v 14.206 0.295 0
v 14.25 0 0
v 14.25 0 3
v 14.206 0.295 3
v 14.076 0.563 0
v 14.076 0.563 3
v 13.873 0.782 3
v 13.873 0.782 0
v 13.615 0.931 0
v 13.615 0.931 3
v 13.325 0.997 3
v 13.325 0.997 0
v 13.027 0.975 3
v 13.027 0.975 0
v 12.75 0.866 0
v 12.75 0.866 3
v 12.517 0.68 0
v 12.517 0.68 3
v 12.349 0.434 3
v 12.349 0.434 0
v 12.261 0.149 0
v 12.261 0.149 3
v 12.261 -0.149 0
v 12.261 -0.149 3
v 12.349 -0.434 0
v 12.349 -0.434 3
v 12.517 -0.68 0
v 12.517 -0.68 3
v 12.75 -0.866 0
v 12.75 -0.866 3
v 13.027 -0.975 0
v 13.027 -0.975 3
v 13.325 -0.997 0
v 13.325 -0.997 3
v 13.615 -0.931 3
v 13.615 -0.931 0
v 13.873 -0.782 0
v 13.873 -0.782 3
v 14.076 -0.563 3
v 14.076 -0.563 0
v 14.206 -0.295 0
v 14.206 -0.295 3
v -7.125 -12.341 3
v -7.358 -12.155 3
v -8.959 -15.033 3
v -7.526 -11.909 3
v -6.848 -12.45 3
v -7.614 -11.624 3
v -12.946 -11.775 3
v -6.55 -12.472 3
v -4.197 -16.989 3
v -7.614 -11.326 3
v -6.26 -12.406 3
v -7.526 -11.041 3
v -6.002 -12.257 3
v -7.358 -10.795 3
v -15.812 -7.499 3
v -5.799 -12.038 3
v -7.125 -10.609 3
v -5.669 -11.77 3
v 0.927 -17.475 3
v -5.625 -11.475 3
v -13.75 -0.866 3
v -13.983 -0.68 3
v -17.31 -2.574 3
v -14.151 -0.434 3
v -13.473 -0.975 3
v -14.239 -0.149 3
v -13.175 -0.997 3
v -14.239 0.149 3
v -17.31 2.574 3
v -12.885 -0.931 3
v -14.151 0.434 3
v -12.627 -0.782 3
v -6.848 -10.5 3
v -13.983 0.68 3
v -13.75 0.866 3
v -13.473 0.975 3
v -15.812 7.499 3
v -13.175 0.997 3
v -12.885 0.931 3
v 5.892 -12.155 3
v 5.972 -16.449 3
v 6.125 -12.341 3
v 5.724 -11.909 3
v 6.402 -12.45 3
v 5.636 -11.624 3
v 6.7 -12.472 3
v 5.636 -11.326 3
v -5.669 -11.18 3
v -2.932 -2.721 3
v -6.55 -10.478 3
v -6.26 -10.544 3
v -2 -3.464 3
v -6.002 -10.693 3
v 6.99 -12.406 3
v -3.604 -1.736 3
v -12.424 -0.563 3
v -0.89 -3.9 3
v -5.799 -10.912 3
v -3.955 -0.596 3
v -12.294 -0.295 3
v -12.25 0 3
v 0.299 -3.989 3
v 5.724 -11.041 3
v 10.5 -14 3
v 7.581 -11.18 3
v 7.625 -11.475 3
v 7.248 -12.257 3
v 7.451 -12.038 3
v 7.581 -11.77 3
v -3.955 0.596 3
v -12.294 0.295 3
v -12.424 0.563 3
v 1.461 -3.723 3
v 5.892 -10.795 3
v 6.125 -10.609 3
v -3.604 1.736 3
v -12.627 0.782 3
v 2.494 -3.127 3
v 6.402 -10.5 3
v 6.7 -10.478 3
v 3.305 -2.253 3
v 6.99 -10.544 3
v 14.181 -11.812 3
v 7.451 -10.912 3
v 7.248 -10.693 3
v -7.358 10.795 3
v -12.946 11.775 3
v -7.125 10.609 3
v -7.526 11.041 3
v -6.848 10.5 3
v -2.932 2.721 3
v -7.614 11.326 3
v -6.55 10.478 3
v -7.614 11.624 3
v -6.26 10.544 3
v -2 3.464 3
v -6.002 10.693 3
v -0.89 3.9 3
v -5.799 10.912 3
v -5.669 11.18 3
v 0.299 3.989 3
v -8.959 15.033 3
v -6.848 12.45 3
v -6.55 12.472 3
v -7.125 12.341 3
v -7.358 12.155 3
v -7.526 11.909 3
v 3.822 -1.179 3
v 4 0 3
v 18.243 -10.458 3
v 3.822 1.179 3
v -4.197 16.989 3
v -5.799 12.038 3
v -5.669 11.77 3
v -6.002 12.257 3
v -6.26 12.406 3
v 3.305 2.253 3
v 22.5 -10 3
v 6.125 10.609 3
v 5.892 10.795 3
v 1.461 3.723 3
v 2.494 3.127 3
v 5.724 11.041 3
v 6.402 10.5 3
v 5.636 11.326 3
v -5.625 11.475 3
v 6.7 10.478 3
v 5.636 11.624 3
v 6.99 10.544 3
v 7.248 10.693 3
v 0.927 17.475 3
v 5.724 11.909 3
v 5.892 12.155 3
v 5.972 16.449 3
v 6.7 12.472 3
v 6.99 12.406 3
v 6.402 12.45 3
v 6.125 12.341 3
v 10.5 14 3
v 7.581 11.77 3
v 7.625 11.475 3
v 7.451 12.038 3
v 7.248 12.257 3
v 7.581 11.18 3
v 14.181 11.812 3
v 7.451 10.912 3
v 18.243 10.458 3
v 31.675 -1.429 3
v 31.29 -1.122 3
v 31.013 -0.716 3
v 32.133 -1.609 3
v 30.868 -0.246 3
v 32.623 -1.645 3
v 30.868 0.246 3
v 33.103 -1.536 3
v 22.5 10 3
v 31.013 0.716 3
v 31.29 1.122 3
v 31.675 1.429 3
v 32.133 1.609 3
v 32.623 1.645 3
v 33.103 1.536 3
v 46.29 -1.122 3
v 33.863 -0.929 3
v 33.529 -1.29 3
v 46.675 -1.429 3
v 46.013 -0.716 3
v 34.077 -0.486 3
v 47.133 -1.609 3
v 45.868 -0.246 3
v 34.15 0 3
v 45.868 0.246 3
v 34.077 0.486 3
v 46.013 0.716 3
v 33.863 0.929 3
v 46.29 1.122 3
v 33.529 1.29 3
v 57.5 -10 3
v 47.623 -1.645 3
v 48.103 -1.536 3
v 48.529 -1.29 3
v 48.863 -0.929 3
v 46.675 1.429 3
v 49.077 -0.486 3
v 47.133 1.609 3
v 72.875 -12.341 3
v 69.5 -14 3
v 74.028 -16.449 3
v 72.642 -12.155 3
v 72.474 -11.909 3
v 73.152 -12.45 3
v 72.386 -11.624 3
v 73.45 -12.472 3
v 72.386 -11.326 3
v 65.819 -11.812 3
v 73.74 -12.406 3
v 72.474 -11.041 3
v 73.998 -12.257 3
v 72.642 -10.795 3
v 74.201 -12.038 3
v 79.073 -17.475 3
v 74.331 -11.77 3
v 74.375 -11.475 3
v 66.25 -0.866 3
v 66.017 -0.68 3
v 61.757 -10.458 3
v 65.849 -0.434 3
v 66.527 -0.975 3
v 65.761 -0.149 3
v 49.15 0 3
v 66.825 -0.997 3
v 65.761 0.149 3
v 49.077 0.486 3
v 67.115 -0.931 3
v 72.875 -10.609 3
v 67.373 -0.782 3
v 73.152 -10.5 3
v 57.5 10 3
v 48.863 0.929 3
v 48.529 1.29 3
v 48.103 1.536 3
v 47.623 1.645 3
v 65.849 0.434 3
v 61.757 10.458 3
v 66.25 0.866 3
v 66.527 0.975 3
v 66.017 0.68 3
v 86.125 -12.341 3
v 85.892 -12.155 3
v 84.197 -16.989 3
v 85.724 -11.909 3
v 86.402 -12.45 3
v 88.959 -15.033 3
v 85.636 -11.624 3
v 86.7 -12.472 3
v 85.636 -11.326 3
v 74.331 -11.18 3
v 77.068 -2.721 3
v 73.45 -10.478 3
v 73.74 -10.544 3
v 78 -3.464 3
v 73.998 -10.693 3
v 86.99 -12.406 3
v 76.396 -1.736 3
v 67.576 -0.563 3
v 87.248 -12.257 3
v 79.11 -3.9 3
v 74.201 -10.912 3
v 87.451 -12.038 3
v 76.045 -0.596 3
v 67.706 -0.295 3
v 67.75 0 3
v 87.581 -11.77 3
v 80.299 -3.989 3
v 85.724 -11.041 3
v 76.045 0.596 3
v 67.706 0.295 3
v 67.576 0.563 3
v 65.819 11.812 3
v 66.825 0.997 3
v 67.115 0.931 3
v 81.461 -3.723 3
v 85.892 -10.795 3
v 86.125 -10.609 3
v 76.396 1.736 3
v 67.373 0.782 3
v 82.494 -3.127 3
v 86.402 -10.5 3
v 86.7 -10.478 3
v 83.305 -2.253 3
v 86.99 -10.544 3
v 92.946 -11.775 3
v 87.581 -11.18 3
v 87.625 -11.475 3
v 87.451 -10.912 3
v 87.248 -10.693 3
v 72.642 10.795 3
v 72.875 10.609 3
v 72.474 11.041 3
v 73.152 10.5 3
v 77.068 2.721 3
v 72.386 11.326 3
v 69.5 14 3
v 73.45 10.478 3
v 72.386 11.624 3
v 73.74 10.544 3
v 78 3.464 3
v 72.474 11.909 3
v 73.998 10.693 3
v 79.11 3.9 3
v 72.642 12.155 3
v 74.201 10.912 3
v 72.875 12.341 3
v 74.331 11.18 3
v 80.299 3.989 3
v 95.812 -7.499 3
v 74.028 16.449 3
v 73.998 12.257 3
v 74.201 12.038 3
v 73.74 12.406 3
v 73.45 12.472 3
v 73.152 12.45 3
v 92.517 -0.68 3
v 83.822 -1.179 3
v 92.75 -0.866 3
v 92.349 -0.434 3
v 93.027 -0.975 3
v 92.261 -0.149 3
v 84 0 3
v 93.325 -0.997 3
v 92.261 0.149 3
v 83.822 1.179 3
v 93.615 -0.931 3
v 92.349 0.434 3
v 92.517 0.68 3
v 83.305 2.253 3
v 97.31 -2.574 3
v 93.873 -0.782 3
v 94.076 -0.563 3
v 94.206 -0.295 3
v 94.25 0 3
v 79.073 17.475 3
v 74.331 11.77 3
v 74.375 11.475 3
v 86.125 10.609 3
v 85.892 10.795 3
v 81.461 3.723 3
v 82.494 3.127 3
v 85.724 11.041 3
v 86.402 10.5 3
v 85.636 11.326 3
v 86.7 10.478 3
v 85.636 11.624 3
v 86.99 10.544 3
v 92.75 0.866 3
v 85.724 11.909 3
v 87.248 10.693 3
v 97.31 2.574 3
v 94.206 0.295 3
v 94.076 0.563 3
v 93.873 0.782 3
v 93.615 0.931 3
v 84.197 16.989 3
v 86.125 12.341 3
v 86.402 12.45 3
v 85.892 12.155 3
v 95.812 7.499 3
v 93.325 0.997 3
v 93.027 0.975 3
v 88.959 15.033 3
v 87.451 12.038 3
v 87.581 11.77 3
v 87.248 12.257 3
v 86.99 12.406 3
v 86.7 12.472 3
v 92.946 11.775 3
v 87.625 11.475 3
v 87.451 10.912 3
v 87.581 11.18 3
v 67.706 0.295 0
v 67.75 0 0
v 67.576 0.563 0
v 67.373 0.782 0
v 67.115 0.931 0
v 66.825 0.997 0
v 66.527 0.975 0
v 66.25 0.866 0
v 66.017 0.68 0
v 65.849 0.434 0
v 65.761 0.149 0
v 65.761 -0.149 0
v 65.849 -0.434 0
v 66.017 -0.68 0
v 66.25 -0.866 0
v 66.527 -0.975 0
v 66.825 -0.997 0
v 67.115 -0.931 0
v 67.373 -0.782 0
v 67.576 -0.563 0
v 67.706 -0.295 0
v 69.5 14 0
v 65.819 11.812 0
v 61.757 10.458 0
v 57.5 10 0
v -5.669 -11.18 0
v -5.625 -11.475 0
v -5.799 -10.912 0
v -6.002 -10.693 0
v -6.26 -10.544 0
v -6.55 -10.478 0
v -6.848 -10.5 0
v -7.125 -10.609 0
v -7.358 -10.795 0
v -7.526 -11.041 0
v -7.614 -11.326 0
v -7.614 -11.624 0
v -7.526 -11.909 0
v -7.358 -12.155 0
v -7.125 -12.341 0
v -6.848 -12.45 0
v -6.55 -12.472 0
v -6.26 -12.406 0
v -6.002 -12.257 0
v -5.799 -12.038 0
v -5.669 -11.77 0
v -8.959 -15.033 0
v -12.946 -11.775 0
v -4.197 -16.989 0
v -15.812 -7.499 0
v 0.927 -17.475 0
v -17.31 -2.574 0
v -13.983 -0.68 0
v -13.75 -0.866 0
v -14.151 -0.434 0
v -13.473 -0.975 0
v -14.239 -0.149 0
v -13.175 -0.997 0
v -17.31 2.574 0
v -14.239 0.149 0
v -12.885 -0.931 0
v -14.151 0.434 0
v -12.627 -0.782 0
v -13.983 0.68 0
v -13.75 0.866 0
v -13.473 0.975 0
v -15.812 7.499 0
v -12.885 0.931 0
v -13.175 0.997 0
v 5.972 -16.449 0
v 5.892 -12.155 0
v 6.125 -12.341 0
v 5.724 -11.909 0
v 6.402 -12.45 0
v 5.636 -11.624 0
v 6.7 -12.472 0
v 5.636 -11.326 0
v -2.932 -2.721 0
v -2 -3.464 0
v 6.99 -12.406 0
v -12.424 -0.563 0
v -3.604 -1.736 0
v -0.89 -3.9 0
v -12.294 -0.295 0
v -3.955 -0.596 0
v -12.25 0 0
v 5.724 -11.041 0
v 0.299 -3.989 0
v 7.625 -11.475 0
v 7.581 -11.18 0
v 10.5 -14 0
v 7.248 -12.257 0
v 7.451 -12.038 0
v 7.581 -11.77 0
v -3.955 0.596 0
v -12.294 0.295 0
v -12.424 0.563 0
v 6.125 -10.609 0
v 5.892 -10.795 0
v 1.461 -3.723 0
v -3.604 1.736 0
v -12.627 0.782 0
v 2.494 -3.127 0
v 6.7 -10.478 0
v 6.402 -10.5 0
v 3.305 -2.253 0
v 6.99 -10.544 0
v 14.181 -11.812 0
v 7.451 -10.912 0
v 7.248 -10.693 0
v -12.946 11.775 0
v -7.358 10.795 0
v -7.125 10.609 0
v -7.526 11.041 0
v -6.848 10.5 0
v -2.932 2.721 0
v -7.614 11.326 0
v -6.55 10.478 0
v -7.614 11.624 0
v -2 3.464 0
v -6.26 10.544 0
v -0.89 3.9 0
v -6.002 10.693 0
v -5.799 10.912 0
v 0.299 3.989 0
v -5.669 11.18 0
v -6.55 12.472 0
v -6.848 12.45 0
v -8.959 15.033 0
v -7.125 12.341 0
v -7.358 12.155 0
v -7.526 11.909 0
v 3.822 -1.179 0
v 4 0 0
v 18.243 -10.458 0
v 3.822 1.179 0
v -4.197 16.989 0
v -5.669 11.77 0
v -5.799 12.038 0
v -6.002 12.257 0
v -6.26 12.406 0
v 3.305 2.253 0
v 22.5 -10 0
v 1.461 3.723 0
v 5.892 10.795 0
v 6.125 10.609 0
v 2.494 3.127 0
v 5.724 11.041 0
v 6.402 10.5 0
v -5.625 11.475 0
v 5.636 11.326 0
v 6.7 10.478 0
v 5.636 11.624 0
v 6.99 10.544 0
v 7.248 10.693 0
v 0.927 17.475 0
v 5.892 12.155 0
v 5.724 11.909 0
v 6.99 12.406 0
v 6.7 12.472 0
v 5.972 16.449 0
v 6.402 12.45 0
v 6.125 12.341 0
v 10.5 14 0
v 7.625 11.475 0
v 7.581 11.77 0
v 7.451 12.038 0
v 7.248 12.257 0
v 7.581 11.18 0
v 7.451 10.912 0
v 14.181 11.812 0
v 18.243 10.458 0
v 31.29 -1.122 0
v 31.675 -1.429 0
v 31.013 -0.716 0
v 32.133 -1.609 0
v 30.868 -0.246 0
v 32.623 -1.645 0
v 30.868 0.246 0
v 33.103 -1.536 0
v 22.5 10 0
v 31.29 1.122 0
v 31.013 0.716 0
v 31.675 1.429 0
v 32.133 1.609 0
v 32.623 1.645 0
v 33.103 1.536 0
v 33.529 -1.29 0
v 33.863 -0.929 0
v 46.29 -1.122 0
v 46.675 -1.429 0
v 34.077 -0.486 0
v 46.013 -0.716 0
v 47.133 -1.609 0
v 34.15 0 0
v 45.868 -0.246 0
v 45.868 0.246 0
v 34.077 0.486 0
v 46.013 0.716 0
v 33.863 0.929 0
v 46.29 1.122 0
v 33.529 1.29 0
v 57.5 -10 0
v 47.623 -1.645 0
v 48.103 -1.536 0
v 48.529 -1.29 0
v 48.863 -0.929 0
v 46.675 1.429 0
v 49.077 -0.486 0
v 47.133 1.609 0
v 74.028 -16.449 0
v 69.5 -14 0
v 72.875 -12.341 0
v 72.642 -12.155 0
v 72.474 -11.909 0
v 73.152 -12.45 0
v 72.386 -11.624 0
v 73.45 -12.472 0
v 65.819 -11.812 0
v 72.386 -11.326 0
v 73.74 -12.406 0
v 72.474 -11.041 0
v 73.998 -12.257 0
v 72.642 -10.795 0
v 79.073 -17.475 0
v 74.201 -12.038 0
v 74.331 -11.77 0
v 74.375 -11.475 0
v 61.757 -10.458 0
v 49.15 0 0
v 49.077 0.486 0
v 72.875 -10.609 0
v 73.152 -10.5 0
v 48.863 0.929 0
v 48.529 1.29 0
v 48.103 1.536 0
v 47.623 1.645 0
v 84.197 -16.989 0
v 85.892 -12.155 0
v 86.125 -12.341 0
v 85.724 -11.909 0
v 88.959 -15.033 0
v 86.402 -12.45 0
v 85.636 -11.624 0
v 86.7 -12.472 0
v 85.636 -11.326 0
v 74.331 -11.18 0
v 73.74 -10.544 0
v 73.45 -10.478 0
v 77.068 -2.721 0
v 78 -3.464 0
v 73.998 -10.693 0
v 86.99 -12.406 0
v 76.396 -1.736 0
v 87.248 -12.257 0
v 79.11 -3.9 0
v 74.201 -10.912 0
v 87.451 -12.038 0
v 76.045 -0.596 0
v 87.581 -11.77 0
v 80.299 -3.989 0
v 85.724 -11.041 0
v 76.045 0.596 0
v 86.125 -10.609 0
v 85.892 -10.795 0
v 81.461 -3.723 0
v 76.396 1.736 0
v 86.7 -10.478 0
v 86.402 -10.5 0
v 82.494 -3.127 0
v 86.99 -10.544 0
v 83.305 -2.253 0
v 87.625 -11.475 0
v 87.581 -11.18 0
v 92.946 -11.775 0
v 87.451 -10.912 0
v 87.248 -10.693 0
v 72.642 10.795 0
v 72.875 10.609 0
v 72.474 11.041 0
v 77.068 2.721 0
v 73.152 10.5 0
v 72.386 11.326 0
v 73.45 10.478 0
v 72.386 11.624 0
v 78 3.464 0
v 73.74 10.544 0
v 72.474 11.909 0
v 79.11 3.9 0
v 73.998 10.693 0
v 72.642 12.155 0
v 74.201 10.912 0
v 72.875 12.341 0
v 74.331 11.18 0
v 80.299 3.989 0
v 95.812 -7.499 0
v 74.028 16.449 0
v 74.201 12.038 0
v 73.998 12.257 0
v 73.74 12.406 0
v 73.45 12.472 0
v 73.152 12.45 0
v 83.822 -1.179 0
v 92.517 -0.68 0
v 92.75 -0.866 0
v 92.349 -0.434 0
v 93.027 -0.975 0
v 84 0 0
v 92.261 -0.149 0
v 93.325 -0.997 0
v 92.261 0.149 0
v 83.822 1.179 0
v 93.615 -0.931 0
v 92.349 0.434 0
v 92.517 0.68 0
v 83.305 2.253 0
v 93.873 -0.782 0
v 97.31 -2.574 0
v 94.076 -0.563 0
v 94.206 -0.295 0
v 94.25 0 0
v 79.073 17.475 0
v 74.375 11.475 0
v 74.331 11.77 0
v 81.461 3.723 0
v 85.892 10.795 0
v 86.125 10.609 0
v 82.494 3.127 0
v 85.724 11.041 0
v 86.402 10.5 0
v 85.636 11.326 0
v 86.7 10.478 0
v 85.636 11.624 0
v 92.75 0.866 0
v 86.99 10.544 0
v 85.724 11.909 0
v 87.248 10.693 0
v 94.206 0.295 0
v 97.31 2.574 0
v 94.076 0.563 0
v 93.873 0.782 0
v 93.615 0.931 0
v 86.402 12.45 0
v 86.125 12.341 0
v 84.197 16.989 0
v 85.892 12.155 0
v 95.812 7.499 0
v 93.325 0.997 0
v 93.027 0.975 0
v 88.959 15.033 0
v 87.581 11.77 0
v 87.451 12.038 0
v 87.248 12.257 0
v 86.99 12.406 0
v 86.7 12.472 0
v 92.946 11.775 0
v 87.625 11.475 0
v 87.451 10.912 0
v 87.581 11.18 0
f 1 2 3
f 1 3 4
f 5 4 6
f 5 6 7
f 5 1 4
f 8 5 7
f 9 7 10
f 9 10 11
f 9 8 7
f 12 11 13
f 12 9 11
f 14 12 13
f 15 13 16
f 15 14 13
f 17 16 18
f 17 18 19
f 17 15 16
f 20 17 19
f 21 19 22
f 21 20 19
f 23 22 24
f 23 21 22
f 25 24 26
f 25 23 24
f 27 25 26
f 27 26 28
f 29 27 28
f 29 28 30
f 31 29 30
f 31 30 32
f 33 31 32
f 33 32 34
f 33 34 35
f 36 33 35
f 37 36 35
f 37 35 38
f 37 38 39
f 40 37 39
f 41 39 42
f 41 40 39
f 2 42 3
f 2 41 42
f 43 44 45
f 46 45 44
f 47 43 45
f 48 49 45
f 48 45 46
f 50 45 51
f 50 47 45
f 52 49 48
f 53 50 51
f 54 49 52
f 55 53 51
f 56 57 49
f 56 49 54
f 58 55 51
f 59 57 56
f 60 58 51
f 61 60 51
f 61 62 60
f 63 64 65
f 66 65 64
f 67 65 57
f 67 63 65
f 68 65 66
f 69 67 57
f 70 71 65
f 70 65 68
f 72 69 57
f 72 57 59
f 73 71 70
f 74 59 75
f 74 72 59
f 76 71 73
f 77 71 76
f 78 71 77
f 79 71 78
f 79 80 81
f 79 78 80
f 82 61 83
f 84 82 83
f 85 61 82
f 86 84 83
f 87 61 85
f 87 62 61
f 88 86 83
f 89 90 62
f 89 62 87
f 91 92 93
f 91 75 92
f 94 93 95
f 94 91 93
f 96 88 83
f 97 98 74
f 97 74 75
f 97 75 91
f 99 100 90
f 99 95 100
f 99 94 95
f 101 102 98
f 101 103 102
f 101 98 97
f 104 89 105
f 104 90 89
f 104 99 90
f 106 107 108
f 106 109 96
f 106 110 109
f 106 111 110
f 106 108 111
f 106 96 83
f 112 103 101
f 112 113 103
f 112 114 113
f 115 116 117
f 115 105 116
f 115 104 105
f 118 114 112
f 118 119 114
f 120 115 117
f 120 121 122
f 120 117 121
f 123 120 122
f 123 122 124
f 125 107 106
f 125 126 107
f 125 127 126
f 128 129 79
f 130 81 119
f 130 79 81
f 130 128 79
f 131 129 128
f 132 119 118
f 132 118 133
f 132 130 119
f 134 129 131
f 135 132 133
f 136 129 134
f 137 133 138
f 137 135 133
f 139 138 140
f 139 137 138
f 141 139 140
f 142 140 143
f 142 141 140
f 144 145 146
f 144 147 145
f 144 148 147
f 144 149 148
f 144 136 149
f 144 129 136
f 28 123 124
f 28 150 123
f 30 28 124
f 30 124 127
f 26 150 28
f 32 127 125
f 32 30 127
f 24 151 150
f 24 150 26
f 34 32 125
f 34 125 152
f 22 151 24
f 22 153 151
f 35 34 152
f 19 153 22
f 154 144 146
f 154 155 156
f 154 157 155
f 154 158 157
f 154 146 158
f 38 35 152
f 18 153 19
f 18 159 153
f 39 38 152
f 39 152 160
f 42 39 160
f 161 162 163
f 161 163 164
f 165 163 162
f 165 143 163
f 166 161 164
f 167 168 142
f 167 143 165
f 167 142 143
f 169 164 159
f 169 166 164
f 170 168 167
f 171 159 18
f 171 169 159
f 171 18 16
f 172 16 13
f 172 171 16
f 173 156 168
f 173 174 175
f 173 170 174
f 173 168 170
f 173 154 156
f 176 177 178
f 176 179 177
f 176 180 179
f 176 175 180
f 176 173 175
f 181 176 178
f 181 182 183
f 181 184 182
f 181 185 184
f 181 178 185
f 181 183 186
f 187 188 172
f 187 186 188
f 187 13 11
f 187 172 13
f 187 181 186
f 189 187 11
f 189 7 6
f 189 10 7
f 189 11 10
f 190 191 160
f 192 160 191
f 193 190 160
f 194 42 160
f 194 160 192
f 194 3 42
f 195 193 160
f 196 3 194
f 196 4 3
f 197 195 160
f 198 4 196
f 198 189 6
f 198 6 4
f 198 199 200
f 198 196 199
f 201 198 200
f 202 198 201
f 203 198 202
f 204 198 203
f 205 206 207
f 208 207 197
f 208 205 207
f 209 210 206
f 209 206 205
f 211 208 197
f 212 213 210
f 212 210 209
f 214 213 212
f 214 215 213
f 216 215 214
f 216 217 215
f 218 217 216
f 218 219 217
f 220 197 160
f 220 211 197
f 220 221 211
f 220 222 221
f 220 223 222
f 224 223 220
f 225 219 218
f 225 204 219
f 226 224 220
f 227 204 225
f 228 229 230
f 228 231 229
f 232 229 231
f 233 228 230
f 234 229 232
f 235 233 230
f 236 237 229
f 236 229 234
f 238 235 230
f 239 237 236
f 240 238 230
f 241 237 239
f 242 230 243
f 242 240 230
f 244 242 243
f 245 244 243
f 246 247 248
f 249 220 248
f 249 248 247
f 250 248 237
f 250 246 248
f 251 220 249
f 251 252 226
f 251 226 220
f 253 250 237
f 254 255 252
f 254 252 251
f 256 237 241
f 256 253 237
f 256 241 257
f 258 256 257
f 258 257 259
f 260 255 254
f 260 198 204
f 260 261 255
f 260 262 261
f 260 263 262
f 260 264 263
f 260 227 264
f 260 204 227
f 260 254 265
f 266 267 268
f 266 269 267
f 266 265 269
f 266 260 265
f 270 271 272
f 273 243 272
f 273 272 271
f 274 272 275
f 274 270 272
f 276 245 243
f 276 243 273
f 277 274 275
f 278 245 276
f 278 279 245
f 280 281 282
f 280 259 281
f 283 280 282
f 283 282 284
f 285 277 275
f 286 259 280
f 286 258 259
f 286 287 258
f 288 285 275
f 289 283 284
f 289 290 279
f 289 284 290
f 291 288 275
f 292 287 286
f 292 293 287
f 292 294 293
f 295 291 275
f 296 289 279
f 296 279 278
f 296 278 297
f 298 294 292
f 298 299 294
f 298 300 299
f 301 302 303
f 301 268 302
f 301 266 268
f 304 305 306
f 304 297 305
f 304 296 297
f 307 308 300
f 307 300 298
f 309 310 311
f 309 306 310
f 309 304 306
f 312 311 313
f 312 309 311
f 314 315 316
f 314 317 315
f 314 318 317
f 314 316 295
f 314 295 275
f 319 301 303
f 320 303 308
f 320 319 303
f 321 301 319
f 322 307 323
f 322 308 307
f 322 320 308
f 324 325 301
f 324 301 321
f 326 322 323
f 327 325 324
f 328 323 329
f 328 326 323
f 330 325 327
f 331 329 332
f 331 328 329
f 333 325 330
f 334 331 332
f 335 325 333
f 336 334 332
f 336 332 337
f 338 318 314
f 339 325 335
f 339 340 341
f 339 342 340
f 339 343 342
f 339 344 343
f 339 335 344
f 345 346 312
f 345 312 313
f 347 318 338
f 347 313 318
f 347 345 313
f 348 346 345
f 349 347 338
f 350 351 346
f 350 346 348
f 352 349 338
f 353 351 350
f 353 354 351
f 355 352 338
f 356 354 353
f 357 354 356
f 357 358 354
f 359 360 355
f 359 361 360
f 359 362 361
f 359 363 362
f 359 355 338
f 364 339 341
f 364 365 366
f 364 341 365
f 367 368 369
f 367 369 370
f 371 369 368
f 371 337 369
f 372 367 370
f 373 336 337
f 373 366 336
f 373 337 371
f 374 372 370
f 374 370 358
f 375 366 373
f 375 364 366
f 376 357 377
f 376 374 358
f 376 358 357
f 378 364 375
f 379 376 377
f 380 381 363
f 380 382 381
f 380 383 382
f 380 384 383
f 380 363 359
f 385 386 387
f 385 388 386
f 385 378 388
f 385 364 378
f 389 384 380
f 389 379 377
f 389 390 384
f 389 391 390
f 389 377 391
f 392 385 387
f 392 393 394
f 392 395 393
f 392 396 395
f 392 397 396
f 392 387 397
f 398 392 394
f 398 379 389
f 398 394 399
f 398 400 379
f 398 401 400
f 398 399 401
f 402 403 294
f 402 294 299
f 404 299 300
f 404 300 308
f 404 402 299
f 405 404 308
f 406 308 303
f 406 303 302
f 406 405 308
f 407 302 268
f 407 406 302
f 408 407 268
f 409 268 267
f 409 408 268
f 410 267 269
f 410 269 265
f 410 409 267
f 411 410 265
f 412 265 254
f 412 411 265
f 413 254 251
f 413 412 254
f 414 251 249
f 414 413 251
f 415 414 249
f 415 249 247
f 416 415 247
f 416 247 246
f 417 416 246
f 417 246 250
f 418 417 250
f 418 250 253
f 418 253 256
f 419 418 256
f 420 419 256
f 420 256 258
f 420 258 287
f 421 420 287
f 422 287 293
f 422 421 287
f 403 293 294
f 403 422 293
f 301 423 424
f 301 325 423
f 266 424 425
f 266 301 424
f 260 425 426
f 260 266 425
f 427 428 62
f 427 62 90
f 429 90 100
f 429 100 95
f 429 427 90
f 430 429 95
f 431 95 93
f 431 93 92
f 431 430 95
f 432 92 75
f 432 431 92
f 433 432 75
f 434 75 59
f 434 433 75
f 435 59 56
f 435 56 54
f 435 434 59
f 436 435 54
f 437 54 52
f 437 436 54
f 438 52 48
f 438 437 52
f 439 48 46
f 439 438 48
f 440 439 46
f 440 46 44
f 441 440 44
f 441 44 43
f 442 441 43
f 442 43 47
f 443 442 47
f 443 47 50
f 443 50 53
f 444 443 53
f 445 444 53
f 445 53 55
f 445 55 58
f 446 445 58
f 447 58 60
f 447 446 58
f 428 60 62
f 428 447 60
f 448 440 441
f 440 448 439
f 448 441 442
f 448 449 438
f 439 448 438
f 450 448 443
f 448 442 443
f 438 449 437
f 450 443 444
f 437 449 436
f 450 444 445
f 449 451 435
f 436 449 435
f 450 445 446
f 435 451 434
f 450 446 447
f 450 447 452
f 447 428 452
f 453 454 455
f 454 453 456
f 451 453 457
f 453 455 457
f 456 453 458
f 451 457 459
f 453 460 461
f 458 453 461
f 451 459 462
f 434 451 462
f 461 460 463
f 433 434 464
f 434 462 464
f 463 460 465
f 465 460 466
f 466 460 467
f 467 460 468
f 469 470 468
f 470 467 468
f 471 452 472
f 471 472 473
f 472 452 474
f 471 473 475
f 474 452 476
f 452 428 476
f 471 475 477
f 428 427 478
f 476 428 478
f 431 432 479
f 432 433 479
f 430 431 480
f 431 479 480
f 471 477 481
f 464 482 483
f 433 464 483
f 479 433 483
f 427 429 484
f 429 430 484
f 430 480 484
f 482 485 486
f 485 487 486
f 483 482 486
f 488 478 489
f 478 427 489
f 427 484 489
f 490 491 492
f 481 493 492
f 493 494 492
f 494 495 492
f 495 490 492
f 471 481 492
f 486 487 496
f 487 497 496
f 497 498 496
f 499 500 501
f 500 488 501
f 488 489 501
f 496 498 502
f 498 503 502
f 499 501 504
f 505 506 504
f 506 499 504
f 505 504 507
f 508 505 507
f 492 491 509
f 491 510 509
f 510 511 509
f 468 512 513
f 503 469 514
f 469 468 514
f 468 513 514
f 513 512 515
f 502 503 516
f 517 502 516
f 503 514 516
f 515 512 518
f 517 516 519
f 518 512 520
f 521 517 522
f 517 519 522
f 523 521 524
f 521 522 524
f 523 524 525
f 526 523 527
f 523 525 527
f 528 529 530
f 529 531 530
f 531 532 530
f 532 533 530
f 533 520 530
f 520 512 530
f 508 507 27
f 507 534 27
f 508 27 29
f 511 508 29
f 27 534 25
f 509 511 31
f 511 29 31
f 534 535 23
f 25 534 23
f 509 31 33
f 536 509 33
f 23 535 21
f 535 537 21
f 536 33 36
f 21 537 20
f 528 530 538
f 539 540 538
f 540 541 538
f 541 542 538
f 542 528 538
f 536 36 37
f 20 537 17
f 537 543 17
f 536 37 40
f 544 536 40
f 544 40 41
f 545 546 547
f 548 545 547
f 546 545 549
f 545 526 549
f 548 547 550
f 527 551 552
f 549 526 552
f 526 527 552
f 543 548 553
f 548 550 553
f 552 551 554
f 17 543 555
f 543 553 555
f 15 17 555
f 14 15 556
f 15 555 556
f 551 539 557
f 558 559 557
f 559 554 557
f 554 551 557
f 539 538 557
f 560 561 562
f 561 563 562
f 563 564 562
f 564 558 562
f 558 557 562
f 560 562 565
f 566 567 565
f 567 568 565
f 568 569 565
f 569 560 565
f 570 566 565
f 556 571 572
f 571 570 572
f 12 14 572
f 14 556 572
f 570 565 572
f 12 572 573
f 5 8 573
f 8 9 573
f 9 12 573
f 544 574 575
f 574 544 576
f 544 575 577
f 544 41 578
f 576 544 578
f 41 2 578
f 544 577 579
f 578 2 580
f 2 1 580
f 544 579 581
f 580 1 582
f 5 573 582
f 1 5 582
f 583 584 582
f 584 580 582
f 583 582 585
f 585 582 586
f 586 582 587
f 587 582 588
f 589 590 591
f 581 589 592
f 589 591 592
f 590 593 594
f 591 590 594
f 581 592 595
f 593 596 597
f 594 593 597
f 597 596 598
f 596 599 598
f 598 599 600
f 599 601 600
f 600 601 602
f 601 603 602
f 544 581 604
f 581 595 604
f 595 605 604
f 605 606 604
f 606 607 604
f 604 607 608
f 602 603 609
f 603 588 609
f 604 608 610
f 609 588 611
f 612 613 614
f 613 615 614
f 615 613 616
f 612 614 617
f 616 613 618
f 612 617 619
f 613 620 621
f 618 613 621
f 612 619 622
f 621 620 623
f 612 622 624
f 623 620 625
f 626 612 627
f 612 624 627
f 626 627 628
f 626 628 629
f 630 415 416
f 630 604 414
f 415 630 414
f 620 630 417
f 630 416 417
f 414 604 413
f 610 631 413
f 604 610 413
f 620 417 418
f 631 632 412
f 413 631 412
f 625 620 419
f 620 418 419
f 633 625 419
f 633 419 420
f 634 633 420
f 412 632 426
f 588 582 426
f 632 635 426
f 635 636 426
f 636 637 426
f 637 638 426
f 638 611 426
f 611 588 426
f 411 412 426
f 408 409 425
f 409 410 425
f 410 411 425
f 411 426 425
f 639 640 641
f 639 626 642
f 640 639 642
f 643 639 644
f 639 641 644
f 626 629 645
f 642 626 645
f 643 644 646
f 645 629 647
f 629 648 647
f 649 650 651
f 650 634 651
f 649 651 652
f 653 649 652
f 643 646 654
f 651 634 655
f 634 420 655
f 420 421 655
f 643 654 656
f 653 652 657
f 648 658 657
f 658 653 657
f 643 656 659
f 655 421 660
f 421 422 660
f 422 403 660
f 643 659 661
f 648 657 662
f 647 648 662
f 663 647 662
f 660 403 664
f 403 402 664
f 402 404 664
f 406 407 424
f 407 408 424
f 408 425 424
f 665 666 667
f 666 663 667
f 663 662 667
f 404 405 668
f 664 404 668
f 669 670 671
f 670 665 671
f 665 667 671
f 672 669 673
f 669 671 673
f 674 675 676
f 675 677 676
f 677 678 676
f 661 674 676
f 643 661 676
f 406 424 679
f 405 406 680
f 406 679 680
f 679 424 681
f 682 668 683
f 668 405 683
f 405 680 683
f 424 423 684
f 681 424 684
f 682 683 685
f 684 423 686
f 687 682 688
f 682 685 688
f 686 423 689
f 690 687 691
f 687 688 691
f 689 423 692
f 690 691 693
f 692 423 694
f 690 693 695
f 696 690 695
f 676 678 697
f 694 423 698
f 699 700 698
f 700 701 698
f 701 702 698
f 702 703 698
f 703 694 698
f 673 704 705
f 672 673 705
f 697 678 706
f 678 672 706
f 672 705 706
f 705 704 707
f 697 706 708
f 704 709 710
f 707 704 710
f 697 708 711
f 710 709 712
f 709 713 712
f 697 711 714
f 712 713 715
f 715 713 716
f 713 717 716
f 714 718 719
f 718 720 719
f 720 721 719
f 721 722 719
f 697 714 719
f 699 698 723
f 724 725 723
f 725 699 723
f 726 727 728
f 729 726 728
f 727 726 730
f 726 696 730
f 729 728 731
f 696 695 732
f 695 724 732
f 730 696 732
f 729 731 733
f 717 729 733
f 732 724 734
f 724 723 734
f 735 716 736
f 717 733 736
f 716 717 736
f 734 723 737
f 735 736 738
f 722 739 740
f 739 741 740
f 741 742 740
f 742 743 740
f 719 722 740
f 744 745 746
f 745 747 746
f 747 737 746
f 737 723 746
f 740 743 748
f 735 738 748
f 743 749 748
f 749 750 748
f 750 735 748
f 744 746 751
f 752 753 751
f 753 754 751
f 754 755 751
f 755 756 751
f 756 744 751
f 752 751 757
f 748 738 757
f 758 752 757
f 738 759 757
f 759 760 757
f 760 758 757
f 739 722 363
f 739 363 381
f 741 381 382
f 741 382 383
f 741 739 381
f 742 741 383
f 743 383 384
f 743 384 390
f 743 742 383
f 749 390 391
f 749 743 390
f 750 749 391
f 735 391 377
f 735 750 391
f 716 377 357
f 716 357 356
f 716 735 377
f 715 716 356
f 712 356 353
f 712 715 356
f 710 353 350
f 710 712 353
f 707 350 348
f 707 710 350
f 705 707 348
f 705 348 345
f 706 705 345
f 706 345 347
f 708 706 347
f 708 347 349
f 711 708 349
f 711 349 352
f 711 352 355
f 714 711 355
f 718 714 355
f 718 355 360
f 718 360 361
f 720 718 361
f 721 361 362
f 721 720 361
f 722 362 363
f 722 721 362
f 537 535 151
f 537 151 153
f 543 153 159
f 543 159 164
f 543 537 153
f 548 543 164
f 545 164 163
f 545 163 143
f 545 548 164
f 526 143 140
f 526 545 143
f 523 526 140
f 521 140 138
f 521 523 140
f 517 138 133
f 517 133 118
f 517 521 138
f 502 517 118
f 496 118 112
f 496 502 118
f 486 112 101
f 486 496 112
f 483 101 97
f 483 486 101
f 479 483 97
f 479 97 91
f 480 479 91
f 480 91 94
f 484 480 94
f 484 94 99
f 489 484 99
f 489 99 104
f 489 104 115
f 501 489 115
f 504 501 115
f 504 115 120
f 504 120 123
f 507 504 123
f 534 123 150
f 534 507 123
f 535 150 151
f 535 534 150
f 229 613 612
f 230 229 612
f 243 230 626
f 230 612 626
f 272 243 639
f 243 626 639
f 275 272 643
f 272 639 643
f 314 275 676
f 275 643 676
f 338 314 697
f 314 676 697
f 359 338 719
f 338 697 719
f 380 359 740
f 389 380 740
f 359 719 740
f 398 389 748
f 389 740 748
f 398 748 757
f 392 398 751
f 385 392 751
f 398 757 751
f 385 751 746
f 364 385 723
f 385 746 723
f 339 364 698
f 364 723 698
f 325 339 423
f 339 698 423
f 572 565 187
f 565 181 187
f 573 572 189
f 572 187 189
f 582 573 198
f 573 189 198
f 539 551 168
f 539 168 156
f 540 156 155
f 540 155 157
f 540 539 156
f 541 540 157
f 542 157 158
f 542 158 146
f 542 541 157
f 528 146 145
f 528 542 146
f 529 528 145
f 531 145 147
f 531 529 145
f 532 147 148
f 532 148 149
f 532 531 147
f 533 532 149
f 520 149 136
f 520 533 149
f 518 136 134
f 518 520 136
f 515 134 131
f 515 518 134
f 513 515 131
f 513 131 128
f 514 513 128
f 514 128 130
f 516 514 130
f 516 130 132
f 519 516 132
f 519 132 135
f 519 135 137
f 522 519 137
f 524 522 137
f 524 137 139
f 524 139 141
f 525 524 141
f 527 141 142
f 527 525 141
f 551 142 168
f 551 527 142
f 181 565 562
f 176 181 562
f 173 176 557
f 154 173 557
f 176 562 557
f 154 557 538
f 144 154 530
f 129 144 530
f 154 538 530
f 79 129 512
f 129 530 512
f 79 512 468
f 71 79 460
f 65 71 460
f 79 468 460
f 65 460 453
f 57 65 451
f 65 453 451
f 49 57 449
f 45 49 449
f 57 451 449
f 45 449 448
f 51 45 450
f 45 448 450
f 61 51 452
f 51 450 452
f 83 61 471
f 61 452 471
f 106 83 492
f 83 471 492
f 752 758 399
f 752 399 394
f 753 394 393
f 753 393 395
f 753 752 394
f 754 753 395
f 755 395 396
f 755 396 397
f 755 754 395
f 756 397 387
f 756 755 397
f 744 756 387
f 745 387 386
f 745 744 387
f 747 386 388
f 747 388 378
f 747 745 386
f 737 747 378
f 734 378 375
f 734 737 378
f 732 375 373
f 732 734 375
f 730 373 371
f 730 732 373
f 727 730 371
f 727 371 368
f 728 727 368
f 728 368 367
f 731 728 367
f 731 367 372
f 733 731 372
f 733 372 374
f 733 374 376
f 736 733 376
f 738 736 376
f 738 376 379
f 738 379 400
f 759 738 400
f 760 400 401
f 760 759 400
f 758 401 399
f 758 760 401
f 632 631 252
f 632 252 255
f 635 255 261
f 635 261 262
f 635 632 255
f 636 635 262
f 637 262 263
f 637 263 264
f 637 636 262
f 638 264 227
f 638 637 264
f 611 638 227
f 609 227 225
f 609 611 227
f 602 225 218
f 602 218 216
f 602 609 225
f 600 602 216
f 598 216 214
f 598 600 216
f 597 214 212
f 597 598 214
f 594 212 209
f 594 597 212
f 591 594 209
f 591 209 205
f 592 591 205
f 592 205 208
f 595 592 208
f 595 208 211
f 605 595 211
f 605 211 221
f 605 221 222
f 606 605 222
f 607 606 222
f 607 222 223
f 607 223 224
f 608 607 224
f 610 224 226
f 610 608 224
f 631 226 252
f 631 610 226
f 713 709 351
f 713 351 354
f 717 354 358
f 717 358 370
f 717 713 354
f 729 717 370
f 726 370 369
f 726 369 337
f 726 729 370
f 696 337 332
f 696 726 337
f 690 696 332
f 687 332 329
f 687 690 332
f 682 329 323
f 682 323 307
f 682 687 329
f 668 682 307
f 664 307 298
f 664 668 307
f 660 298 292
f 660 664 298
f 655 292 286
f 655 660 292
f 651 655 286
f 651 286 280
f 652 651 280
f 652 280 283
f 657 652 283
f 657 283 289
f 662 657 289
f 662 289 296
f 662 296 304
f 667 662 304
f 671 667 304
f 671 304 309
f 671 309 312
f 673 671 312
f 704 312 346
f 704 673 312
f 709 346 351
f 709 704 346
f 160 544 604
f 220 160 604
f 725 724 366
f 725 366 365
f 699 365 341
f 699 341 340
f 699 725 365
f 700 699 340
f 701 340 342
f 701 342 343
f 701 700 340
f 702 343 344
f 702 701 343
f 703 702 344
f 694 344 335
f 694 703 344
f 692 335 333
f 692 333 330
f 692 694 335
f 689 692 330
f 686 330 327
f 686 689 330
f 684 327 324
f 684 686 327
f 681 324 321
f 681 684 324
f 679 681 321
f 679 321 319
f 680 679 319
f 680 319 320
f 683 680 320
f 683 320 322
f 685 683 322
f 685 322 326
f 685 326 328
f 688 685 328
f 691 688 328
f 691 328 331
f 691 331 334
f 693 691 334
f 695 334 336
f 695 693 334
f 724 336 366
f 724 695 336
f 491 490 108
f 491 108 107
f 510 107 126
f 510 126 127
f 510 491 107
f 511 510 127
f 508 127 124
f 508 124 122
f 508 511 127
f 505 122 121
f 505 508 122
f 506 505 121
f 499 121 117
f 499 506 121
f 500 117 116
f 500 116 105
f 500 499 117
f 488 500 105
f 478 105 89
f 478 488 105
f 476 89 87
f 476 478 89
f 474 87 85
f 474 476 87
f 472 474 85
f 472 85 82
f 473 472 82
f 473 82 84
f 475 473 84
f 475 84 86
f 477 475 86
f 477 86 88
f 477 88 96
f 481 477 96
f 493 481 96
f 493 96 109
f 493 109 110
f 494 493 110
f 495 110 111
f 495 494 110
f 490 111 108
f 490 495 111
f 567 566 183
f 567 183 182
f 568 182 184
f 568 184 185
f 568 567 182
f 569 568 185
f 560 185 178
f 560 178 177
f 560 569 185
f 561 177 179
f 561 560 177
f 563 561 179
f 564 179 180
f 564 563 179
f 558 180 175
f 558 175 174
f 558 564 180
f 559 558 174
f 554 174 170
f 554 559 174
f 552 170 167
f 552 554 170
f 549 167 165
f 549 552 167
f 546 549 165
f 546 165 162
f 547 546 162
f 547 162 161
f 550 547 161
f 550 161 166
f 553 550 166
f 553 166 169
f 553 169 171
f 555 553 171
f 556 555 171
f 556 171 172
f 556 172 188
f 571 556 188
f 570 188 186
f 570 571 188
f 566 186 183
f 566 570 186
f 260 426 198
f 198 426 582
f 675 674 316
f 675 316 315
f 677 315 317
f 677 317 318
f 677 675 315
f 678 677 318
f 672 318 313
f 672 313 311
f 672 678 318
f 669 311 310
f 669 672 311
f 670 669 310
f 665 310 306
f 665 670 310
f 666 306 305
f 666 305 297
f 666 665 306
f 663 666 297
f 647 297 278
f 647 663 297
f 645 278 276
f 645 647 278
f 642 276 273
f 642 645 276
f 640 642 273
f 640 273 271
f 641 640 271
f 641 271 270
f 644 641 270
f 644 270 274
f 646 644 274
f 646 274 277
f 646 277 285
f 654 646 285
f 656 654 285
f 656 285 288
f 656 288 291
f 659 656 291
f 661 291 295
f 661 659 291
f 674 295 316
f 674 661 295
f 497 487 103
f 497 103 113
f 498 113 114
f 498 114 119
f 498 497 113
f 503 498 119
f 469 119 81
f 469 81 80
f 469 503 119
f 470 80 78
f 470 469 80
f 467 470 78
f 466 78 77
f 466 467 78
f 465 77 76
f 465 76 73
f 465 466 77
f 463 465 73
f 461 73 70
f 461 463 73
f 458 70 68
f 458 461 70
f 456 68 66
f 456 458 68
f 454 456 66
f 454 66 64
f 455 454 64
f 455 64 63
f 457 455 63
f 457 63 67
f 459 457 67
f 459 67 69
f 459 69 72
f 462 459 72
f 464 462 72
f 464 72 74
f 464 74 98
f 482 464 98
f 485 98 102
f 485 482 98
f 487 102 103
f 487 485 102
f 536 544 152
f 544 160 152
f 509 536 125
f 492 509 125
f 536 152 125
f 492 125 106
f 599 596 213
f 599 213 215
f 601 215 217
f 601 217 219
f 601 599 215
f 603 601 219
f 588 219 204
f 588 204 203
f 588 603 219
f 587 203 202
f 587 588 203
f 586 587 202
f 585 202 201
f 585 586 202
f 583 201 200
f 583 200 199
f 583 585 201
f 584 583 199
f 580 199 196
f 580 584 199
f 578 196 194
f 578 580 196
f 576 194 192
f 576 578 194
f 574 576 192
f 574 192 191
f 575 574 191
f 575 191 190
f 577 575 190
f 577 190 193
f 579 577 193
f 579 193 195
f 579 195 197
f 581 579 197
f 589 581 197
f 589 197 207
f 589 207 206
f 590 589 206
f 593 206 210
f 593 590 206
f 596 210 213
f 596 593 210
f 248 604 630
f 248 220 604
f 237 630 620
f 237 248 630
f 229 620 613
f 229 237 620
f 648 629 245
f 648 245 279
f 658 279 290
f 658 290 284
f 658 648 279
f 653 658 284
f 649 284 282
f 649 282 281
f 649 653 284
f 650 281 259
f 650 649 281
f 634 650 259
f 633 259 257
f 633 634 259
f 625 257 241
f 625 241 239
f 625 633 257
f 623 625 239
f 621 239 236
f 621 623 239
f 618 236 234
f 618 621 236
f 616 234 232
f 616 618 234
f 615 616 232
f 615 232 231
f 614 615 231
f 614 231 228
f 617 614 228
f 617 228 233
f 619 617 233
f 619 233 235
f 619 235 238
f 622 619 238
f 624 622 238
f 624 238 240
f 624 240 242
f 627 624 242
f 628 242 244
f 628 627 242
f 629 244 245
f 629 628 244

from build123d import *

# Parameters (mm, degrees)
ESBO_O1_R                = 4
ESBO_O1_R_2              = 1
ESBO_O1_R_3              = 1.65
RESSALTO_EXTRUS_O1_DEPTH = 3
FILETE1_R                = 20


with BuildPart() as part:
    # Esboço1 → Ressalto-extrusão1 (new body)
    with BuildSketch(Plane.XY):
        with BuildLine():
            Line((14.361406616, -10), (65.638593384, -10))
            ThreePointArc((65.638593384, -10), (97.5, 0), (65.638593384, 10))
            Line((65.638593384, 10), (14.361406616, 10))
            ThreePointArc((14.361406616, 10), (-17.5, 0), (14.361406616, -10))
        make_face()
        Circle(ESBO_O1_R, mode=Mode.SUBTRACT)
        with Locations((-13.25, 0)):
            Circle(ESBO_O1_R_2, mode=Mode.SUBTRACT)
        with Locations((-6.625, 11.4748366)):
            Circle(ESBO_O1_R_2, mode=Mode.SUBTRACT)
        with Locations((86.625, -11.4748366)):
            Circle(ESBO_O1_R_2, mode=Mode.SUBTRACT)
        with Locations((6.625, 11.4748366)):
            Circle(ESBO_O1_R_2, mode=Mode.SUBTRACT)
        with Locations((80, 0)):
            Circle(ESBO_O1_R, mode=Mode.SUBTRACT)
        with Locations((13.25, 0)):
            Circle(ESBO_O1_R_2, mode=Mode.SUBTRACT)
        with Locations((6.625, -11.4748366)):
            Circle(ESBO_O1_R_2, mode=Mode.SUBTRACT)
        with Locations((-6.625, -11.4748366)):
            Circle(ESBO_O1_R_2, mode=Mode.SUBTRACT)
        with Locations((73.375, -11.4748366)):
            Circle(ESBO_O1_R_2, mode=Mode.SUBTRACT)
        with Locations((66.75, 0)):
            Circle(ESBO_O1_R_2, mode=Mode.SUBTRACT)
        with Locations((73.375, 11.4748366)):
            Circle(ESBO_O1_R_2, mode=Mode.SUBTRACT)
        with Locations((86.625, 11.4748366)):
            Circle(ESBO_O1_R_2, mode=Mode.SUBTRACT)
        with Locations((93.25, 0)):
            Circle(ESBO_O1_R_2, mode=Mode.SUBTRACT)
        with Locations((32.5, 0)):
            Circle(ESBO_O1_R_3, mode=Mode.SUBTRACT)
        with Locations((47.5, 0)):
            Circle(ESBO_O1_R_3, mode=Mode.SUBTRACT)
    extrude(amount=RESSALTO_EXTRUS_O1_DEPTH)

    # Filete1
    filete1_edges = [part.edges().sort_by_distance(p)[0] for p in [
        (65.638593384, -10, 1.5),
        (14.361406616, -10, 1.5),
        (14.361406616, 10, 1.5),
        (65.638593384, 10, 1.5),
    ]]
    fillet(filete1_edges, radius=FILETE1_R)


solid = part.part
